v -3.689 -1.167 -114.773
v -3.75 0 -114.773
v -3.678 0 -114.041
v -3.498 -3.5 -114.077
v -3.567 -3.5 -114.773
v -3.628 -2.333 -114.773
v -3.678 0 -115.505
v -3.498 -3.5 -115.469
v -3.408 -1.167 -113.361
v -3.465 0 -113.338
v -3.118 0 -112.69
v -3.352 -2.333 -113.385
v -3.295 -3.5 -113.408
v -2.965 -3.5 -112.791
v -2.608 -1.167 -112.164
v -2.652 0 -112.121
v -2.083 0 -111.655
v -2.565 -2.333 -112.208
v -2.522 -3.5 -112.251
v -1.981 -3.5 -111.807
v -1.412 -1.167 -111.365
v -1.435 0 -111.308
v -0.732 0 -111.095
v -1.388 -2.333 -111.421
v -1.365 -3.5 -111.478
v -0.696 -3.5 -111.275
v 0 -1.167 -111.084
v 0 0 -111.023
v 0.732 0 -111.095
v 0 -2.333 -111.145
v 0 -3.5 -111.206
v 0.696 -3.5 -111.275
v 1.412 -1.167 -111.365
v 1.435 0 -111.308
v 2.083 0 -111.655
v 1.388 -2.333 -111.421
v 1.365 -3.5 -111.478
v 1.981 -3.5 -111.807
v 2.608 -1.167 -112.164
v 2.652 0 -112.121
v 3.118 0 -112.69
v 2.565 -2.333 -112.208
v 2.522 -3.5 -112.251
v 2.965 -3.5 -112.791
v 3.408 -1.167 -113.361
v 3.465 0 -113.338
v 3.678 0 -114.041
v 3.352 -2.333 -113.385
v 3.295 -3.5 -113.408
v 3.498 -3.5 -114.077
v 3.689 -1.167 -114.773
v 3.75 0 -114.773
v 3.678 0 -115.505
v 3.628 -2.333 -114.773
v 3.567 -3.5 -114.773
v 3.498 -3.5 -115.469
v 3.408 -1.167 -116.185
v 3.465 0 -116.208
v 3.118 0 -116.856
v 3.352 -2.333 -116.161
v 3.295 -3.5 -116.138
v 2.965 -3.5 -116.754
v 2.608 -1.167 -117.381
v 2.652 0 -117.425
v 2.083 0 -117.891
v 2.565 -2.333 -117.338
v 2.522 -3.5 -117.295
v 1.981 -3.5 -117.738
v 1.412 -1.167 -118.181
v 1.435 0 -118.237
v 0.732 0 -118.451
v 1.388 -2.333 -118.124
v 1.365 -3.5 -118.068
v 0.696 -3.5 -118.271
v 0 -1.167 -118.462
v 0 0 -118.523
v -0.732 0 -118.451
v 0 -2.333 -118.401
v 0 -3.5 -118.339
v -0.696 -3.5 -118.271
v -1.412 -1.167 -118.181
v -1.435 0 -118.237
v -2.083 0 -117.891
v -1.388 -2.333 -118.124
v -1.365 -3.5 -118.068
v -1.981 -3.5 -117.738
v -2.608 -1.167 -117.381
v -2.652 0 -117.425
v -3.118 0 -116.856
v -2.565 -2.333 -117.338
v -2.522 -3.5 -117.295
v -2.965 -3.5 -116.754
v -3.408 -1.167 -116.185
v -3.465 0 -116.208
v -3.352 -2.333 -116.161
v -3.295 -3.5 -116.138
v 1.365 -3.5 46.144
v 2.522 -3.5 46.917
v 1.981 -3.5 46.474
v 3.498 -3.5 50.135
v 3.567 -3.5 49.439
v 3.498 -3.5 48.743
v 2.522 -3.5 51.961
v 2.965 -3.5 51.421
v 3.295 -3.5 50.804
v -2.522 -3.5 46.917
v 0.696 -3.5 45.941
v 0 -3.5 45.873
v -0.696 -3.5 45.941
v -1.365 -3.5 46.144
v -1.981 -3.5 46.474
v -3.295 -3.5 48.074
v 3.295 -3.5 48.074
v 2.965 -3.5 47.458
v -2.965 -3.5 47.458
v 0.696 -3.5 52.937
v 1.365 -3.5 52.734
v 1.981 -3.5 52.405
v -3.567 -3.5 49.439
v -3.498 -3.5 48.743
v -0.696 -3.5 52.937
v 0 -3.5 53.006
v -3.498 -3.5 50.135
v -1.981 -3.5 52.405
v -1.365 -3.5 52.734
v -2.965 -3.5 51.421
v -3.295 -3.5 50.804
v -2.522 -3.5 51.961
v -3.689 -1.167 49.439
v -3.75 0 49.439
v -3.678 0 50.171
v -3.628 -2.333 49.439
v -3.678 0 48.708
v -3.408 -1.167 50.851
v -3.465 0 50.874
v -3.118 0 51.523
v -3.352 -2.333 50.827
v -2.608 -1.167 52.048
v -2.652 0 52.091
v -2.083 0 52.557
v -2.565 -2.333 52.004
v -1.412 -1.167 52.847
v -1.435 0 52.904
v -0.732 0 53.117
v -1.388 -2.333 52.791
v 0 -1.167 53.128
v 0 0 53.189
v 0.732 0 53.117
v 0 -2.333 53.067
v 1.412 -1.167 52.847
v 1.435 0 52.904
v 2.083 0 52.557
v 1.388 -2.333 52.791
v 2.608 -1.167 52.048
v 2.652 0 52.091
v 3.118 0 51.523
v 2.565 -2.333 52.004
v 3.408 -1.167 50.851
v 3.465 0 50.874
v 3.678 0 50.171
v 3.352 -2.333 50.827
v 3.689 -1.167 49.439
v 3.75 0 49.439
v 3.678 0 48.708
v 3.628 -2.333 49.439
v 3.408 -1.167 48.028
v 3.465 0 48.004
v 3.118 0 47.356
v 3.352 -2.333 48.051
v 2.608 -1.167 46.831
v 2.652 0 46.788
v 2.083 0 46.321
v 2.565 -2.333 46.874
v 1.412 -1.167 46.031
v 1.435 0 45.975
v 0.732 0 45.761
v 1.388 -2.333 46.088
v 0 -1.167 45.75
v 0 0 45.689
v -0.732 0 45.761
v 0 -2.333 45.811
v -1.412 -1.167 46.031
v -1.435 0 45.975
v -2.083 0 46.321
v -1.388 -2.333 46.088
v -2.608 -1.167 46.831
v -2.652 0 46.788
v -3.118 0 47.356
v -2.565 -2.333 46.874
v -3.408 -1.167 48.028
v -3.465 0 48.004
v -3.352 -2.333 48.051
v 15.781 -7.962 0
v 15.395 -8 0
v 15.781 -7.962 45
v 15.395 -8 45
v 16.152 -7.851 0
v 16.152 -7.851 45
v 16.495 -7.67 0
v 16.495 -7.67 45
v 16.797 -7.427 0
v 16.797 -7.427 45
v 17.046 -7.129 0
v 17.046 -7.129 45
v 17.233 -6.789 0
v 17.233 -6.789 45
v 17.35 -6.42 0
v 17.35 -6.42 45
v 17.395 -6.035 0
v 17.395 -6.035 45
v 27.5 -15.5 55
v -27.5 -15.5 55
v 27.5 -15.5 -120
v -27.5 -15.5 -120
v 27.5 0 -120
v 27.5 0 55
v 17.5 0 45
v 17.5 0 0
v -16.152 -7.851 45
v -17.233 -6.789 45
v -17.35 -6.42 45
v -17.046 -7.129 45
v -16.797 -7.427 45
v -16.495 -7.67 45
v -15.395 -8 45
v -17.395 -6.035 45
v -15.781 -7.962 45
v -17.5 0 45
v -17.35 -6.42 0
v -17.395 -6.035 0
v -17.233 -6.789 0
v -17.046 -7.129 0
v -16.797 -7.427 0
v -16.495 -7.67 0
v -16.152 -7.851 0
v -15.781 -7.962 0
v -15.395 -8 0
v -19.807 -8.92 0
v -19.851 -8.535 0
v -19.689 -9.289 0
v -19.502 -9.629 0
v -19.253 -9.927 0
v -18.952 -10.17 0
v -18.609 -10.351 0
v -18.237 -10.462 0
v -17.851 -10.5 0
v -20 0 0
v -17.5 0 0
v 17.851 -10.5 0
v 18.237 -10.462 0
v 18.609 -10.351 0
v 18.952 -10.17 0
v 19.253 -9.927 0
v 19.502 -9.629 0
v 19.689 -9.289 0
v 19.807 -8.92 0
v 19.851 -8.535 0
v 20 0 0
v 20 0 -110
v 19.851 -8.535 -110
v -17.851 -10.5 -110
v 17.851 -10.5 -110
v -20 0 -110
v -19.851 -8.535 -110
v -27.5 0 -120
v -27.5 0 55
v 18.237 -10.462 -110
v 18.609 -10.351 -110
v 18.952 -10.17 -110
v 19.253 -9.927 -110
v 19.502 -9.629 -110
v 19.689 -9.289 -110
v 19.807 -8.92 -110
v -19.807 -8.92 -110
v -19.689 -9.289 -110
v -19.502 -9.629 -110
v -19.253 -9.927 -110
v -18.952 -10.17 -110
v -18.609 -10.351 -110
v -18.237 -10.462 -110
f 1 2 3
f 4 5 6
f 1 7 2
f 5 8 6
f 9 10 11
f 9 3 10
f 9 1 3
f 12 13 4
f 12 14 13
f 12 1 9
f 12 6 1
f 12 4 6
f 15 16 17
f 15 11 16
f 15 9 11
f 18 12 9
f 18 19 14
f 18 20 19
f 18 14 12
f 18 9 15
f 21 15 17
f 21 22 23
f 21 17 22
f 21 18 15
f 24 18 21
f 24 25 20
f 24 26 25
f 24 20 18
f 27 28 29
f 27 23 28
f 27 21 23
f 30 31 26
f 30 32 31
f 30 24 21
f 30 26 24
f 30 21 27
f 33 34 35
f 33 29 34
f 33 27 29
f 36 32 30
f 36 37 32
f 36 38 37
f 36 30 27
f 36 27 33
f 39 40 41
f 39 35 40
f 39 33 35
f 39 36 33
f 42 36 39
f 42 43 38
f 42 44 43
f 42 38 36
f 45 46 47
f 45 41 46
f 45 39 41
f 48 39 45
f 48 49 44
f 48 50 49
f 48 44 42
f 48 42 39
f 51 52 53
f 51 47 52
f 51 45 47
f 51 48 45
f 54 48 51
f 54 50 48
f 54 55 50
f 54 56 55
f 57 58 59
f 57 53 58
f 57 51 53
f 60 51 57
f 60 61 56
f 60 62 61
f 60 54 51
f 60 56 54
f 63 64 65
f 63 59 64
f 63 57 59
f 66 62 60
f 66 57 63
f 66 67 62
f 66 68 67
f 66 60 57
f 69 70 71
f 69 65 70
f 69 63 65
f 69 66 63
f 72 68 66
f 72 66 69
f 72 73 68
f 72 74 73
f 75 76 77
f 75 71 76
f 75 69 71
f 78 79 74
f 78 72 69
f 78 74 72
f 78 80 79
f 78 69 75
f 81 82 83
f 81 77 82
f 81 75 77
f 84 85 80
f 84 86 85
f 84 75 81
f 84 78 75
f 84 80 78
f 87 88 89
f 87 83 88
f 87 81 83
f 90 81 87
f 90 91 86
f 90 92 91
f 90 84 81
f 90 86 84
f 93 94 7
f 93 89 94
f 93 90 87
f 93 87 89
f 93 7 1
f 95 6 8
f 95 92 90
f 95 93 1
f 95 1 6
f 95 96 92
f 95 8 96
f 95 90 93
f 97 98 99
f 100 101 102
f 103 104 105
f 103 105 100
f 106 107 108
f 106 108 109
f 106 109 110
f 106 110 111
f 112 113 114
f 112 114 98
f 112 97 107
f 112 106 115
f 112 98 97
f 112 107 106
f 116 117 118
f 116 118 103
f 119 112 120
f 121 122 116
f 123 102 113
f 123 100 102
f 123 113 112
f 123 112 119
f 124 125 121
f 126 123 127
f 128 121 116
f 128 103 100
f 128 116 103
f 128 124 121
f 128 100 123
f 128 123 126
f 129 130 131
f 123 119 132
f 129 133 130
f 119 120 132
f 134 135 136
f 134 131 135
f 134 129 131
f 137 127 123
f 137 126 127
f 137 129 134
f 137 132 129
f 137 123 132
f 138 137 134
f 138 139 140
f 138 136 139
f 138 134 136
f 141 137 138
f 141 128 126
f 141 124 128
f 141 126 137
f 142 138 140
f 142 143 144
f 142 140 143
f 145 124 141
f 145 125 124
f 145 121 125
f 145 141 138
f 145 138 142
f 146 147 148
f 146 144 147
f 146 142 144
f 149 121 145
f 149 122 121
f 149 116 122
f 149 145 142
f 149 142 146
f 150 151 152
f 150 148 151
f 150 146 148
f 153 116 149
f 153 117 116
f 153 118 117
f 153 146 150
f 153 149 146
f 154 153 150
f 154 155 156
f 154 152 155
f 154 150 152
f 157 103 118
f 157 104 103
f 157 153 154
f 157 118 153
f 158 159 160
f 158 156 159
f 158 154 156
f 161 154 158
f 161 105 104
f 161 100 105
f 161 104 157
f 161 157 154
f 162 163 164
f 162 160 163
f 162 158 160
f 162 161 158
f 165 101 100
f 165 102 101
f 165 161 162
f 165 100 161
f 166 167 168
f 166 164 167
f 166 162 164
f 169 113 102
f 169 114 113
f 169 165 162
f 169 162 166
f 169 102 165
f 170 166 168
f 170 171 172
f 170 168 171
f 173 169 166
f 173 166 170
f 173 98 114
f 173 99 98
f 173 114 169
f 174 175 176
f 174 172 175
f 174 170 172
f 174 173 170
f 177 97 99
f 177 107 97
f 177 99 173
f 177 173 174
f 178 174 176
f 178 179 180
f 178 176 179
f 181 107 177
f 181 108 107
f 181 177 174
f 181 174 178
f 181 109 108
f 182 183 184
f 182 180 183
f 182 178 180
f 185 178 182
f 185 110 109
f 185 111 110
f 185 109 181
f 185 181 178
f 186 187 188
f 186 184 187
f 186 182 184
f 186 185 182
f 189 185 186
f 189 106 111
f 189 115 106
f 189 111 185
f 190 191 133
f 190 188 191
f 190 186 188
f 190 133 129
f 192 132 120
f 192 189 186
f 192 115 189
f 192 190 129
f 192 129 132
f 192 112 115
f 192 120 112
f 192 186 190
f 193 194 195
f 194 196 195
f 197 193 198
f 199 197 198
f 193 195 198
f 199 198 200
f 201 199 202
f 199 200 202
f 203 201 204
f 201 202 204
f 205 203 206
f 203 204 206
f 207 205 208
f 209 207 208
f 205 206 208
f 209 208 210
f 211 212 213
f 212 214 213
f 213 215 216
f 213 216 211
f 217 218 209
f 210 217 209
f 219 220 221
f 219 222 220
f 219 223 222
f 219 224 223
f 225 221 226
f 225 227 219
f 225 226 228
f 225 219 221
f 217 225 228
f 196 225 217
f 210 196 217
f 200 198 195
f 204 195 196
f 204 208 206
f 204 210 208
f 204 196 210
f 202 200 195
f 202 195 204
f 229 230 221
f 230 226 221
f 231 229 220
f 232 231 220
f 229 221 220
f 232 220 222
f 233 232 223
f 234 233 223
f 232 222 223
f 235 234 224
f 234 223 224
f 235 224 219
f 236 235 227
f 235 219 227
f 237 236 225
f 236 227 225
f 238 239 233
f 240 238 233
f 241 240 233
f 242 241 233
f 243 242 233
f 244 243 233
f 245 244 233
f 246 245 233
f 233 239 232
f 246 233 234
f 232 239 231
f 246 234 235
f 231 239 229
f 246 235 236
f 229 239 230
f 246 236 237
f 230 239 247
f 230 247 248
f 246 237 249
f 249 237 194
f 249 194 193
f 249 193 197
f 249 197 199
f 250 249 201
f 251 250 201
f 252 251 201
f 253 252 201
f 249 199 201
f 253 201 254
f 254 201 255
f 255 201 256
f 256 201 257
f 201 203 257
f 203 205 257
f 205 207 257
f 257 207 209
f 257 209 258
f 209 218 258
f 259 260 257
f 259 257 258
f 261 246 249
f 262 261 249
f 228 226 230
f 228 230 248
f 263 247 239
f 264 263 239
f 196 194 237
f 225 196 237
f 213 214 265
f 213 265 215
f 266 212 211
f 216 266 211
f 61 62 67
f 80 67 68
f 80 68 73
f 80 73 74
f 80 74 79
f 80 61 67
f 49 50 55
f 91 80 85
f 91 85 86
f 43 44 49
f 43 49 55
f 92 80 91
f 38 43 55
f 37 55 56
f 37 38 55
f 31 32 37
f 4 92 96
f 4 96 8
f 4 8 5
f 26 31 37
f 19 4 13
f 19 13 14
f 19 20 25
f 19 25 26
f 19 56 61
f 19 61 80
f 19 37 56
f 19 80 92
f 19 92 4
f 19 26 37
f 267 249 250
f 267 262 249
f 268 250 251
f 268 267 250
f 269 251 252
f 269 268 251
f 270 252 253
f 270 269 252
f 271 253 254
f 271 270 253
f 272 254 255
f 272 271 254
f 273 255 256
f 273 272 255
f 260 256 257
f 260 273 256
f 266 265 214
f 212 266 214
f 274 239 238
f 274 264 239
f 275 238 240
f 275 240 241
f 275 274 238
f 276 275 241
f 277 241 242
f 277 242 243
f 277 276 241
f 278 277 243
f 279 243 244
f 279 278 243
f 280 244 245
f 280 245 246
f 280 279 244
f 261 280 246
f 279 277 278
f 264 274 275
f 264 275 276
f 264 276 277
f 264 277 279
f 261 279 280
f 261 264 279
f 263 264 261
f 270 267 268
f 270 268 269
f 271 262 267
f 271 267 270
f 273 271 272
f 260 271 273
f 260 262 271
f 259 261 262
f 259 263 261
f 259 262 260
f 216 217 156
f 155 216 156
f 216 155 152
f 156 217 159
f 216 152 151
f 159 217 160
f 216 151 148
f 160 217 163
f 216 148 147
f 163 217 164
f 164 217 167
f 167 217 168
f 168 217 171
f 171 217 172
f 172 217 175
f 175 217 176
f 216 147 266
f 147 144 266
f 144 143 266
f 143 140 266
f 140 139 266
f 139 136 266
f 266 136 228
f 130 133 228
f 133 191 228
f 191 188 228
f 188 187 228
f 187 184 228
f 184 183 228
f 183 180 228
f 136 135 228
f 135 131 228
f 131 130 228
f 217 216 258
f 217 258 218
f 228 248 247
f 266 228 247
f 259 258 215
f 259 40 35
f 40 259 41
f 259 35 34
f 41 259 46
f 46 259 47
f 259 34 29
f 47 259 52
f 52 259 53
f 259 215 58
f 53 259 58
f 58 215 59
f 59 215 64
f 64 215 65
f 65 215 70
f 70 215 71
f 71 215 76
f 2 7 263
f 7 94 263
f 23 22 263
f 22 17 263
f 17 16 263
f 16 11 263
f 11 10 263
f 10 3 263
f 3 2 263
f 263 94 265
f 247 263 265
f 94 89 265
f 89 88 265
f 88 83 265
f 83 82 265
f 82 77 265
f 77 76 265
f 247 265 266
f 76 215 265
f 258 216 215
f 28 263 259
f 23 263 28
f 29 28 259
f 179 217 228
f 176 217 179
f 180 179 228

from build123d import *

# Parameters (mm, degrees)
F0_W      = 50
F0_H      = 26
F1_DEPTH  = 55
F3_DEPTH  = 45
F4_R      = 2
F5_R      = 2
F6_W      = 55
F6_H      = 31
F7_DEPTH  = 120
F9_DEPTH  = 110
F10_R     = 2
F11_W     = 193.8701719046
F11_H     = 235.1342812181
F12_DEPTH = 15.501
F13_R     = 3.75
F14_DEPTH = 3.5
F14_TAPER = 3
F15_DEPTH = 55


with BuildPart() as f1:
    # F0 (on Top) → F1 (new body)
    with BuildSketch(Plane.XY):
        Rectangle(F0_W, F0_H)
    extrude(amount=F1_DEPTH)

    # F2 (on face) → F3 (cut)
    with BuildSketch(Plane(origin=(0, 0, 0), x_dir=(1, 0, 0), z_dir=(0, 0, -1))):
        Polygon((-17.3603594806, -8), (17.3603594806, -8), (17.5, 0), (17.3603594806, 8), (-17.3603594806, 8), (-17.5, 0), align=None)
    extrude(amount=-F3_DEPTH, mode=Mode.SUBTRACT)

    # F4
    f4_edges = [f1.edges().sort_by_distance(p)[0] for p in [
        (-17.360359, 8, 22.5),
        (17.360359, 8, 22.5),
    ]]
    fillet(f4_edges, radius=F4_R)

    # F5
    f5_edges = [f1.edges().sort_by_distance(p)[0] for p in [
        (-17.360359, -8, 22.5),
        (17.360359, -8, 22.5),
    ]]
    fillet(f5_edges, radius=F5_R)

    # F6 (on face) → F7 (join)
    with BuildSketch(Plane(origin=(0, 0, 0), x_dir=(1, 0, 0), z_dir=(0, 0, -1))):
        Rectangle(F6_W, F6_H)
    extrude(amount=F7_DEPTH)

    # F8 (on face) → F9 (cut)
    with BuildSketch(Plane.XY):
        Polygon((-19.8167218183, 10.5), (-20, 0), (-19.8167218183, -10.5), (19.8167218183, -10.5), (20, 0), (19.8167218183, 10.5), align=None)
    extrude(amount=-F9_DEPTH, mode=Mode.SUBTRACT)

    # F10
    f10_edges = [f1.edges().sort_by_distance(p)[0] for p in [
        (-19.816722, -10.5, -55),
        (19.816722, -10.5, -55),
        (-19.816722, 10.5, -55),
        (19.816722, 10.5, -55),
    ]]
    fillet(f10_edges, radius=F10_R)

    # F11 (on Front) → F12 (cut, through all)
    with BuildSketch(Plane.XZ):
        with Locations((2.0464733243, -30.8961831033)):
            Rectangle(F11_W, F11_H)
    extrude(amount=-F12_DEPTH, mode=Mode.SUBTRACT)

    # F13 (on face) → F14 (cut)
    with BuildSketch(Plane(origin=(0, 0, 0), x_dir=(-1, 0, 0), z_dir=(0, 1, 0))):
        with Locations((0, 49.4391918182)):
            Circle(F13_R)
        with Locations((0, -114.7729158401)):
            Circle(F13_R)
    extrude(amount=-F14_DEPTH, taper=F14_TAPER, mode=Mode.SUBTRACT)

    # F15 (add, through all): a face of the model
    f15_faces = [f1.faces().sort_by_distance(p)[0] for p in [
        (-26.9285763393, -7.75, 0),
    ]]
    extrude(f15_faces, amount=F15_DEPTH)


solid = f1.part
